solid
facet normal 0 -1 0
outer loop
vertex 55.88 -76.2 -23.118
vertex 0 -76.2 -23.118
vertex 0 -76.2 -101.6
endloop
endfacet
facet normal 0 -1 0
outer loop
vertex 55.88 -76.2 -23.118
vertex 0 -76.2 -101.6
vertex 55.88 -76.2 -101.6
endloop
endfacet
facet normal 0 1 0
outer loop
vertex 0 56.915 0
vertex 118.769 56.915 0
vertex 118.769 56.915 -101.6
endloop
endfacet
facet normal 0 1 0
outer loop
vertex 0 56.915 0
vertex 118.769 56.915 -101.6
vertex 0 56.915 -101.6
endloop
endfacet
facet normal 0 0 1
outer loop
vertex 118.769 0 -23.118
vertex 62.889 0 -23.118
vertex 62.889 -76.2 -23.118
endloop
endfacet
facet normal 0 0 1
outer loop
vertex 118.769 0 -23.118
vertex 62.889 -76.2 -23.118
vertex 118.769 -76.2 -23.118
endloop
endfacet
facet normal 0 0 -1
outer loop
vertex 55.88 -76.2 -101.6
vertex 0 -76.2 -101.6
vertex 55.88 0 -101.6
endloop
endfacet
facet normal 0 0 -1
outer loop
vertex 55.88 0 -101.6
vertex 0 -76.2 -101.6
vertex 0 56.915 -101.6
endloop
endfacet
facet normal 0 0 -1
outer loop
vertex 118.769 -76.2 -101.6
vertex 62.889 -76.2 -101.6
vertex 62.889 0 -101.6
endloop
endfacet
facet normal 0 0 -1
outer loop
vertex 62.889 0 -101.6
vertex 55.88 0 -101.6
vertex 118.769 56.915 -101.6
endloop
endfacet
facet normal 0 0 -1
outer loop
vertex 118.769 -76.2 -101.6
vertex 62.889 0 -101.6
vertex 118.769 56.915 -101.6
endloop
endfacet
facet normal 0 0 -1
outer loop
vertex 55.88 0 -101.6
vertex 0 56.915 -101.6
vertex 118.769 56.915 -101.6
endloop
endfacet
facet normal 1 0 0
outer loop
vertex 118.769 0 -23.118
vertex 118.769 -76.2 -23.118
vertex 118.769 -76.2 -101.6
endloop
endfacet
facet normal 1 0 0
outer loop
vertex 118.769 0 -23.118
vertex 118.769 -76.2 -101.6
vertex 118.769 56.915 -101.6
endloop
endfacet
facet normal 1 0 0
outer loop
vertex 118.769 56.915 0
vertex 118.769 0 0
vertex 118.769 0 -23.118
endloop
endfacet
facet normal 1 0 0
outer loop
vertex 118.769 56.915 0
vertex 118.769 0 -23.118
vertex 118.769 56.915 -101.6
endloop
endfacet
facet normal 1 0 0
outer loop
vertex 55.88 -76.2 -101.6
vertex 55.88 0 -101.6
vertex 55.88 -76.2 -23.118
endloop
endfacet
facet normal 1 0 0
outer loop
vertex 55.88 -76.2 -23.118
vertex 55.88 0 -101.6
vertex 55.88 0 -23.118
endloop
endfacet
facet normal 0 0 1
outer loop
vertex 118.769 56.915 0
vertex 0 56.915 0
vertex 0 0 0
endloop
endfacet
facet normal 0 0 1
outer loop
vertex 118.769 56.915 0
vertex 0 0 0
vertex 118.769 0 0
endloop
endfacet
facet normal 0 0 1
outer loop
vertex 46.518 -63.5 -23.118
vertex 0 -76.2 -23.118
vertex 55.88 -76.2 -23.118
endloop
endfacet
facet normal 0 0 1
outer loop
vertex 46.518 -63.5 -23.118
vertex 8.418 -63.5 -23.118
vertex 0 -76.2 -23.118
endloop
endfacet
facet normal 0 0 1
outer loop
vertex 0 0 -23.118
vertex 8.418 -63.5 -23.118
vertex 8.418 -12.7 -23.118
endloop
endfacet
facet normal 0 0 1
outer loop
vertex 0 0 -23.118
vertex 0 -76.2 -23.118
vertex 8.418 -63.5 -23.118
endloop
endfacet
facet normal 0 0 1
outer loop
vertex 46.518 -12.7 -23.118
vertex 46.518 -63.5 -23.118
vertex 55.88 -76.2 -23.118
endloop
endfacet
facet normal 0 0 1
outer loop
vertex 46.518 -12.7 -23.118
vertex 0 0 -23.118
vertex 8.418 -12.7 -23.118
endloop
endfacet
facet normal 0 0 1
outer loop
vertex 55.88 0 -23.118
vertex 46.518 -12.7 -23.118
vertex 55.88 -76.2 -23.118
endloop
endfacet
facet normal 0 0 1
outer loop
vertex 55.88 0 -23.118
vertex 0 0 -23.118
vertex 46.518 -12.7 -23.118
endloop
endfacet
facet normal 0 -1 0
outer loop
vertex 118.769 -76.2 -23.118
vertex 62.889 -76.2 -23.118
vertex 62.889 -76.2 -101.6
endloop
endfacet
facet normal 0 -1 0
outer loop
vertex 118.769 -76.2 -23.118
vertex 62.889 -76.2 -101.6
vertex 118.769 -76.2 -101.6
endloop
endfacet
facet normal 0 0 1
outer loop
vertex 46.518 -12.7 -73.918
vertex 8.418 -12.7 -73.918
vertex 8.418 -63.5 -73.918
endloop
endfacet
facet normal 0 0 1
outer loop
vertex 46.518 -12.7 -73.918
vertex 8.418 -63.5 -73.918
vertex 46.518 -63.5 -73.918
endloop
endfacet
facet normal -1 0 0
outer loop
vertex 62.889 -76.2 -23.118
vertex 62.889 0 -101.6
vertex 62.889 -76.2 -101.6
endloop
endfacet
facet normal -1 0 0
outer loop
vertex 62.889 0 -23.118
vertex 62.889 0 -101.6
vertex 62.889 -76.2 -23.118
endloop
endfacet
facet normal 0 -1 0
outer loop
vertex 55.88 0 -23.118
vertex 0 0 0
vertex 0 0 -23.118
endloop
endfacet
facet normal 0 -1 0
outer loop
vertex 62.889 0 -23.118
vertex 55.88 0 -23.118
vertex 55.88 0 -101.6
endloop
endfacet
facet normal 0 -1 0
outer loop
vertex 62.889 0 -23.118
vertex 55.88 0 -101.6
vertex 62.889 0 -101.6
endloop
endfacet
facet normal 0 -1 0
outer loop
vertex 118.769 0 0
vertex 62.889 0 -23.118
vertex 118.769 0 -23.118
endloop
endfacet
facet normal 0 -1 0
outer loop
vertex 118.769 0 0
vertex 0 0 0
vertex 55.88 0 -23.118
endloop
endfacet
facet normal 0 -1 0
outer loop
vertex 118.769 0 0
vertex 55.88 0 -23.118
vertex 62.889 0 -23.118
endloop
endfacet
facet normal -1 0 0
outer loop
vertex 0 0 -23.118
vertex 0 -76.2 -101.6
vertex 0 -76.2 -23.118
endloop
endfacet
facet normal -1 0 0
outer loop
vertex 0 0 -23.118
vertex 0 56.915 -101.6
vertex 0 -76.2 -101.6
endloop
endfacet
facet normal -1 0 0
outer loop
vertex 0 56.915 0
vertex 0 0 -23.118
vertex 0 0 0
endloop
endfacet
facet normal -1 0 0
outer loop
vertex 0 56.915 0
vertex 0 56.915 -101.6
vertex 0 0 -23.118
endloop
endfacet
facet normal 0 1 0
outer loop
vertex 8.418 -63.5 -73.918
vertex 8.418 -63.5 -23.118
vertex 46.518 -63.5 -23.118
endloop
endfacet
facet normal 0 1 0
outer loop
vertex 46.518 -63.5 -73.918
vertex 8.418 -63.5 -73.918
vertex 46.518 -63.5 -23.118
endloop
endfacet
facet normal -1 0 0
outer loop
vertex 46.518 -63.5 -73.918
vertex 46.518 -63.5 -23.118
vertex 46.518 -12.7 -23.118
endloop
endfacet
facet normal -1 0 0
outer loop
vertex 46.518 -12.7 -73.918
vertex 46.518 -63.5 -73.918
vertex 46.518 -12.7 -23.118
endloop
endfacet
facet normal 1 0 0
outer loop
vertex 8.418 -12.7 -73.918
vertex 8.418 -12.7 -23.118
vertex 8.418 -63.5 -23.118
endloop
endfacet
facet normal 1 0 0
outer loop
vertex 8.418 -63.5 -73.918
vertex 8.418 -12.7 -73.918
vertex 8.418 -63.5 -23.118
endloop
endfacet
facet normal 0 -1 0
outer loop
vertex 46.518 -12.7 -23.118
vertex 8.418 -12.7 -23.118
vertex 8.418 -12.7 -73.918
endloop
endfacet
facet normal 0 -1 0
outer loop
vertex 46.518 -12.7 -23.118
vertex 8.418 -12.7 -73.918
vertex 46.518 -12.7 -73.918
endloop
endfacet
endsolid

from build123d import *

# Parameters (mm, degrees)
F0_W     = 25.4
F0_H     = 31.1311839489
F0_H_2   = 33.6493795661
F1_DEPTH = 101.6
F2_W     = 55.88
F2_H     = 78.4819734454
F3_DEPTH = 76.2
F4_W     = 38.1
F4_H     = 25.4
F5_DEPTH = 50.8


with BuildPart() as f1:
    # F0 (on Top) → F1 (new body)
    with BuildSketch(Plane.XY):
        Polygon((50.8, 38.1), (50.8, 0), (67.9685074601, 0), (67.9685074601, 38.1), (80.6685074601, 38.1), (106.0685074601, 38.1), (118.7685074601, 38.1), (118.7685074601, 56.9148101586), (0, 56.9148101586), (0, 38.1), (12.7, 38.1), (38.1, 38.1), align=None)
        Polygon((67.9685074601, 38.1), (67.9685074601, 0), (118.7685074601, 0), (118.7685074601, 38.1), (106.0685074601, 38.1), (106.0685074601, 4.4506204339), (80.6685074601, 4.4506204339), (80.6685074601, 38.1), align=None)
        Polygon((0, 38.1), (0, 0), (50.8, 0), (50.8, 38.1), (38.1, 38.1), (38.1, 6.9688160511), (12.7, 6.9688160511), (12.7, 38.1), align=None)
        with Locations((25.4, 22.5344080255)):
            Rectangle(F0_W, F0_H)
        with Locations((93.3685074601, 21.2753102169)):
            Rectangle(F0_W, F0_H_2)
    extrude(amount=-F1_DEPTH)

    # F2 (on face) → F3 (join)
    with BuildSketch(Plane.XZ):
        with Locations((27.94, -62.3590132773)):
            Rectangle(F2_W, F2_H)
        with Locations((90.8285074601, -62.3590132773)):
            Rectangle(F2_W, F2_H)
    extrude(amount=F3_DEPTH)

    # F4 (on face) → F5 (cut)
    with BuildSketch(Plane.XY.offset(-23.1180265546)):
        with Locations((27.4676065892, -25.4)):
            Rectangle(F4_W, F4_H)
        with Locations((27.4676065892, -50.8)):
            Rectangle(F4_W, F4_H)
    extrude(amount=-F5_DEPTH, mode=Mode.SUBTRACT)


solid = f1.part
